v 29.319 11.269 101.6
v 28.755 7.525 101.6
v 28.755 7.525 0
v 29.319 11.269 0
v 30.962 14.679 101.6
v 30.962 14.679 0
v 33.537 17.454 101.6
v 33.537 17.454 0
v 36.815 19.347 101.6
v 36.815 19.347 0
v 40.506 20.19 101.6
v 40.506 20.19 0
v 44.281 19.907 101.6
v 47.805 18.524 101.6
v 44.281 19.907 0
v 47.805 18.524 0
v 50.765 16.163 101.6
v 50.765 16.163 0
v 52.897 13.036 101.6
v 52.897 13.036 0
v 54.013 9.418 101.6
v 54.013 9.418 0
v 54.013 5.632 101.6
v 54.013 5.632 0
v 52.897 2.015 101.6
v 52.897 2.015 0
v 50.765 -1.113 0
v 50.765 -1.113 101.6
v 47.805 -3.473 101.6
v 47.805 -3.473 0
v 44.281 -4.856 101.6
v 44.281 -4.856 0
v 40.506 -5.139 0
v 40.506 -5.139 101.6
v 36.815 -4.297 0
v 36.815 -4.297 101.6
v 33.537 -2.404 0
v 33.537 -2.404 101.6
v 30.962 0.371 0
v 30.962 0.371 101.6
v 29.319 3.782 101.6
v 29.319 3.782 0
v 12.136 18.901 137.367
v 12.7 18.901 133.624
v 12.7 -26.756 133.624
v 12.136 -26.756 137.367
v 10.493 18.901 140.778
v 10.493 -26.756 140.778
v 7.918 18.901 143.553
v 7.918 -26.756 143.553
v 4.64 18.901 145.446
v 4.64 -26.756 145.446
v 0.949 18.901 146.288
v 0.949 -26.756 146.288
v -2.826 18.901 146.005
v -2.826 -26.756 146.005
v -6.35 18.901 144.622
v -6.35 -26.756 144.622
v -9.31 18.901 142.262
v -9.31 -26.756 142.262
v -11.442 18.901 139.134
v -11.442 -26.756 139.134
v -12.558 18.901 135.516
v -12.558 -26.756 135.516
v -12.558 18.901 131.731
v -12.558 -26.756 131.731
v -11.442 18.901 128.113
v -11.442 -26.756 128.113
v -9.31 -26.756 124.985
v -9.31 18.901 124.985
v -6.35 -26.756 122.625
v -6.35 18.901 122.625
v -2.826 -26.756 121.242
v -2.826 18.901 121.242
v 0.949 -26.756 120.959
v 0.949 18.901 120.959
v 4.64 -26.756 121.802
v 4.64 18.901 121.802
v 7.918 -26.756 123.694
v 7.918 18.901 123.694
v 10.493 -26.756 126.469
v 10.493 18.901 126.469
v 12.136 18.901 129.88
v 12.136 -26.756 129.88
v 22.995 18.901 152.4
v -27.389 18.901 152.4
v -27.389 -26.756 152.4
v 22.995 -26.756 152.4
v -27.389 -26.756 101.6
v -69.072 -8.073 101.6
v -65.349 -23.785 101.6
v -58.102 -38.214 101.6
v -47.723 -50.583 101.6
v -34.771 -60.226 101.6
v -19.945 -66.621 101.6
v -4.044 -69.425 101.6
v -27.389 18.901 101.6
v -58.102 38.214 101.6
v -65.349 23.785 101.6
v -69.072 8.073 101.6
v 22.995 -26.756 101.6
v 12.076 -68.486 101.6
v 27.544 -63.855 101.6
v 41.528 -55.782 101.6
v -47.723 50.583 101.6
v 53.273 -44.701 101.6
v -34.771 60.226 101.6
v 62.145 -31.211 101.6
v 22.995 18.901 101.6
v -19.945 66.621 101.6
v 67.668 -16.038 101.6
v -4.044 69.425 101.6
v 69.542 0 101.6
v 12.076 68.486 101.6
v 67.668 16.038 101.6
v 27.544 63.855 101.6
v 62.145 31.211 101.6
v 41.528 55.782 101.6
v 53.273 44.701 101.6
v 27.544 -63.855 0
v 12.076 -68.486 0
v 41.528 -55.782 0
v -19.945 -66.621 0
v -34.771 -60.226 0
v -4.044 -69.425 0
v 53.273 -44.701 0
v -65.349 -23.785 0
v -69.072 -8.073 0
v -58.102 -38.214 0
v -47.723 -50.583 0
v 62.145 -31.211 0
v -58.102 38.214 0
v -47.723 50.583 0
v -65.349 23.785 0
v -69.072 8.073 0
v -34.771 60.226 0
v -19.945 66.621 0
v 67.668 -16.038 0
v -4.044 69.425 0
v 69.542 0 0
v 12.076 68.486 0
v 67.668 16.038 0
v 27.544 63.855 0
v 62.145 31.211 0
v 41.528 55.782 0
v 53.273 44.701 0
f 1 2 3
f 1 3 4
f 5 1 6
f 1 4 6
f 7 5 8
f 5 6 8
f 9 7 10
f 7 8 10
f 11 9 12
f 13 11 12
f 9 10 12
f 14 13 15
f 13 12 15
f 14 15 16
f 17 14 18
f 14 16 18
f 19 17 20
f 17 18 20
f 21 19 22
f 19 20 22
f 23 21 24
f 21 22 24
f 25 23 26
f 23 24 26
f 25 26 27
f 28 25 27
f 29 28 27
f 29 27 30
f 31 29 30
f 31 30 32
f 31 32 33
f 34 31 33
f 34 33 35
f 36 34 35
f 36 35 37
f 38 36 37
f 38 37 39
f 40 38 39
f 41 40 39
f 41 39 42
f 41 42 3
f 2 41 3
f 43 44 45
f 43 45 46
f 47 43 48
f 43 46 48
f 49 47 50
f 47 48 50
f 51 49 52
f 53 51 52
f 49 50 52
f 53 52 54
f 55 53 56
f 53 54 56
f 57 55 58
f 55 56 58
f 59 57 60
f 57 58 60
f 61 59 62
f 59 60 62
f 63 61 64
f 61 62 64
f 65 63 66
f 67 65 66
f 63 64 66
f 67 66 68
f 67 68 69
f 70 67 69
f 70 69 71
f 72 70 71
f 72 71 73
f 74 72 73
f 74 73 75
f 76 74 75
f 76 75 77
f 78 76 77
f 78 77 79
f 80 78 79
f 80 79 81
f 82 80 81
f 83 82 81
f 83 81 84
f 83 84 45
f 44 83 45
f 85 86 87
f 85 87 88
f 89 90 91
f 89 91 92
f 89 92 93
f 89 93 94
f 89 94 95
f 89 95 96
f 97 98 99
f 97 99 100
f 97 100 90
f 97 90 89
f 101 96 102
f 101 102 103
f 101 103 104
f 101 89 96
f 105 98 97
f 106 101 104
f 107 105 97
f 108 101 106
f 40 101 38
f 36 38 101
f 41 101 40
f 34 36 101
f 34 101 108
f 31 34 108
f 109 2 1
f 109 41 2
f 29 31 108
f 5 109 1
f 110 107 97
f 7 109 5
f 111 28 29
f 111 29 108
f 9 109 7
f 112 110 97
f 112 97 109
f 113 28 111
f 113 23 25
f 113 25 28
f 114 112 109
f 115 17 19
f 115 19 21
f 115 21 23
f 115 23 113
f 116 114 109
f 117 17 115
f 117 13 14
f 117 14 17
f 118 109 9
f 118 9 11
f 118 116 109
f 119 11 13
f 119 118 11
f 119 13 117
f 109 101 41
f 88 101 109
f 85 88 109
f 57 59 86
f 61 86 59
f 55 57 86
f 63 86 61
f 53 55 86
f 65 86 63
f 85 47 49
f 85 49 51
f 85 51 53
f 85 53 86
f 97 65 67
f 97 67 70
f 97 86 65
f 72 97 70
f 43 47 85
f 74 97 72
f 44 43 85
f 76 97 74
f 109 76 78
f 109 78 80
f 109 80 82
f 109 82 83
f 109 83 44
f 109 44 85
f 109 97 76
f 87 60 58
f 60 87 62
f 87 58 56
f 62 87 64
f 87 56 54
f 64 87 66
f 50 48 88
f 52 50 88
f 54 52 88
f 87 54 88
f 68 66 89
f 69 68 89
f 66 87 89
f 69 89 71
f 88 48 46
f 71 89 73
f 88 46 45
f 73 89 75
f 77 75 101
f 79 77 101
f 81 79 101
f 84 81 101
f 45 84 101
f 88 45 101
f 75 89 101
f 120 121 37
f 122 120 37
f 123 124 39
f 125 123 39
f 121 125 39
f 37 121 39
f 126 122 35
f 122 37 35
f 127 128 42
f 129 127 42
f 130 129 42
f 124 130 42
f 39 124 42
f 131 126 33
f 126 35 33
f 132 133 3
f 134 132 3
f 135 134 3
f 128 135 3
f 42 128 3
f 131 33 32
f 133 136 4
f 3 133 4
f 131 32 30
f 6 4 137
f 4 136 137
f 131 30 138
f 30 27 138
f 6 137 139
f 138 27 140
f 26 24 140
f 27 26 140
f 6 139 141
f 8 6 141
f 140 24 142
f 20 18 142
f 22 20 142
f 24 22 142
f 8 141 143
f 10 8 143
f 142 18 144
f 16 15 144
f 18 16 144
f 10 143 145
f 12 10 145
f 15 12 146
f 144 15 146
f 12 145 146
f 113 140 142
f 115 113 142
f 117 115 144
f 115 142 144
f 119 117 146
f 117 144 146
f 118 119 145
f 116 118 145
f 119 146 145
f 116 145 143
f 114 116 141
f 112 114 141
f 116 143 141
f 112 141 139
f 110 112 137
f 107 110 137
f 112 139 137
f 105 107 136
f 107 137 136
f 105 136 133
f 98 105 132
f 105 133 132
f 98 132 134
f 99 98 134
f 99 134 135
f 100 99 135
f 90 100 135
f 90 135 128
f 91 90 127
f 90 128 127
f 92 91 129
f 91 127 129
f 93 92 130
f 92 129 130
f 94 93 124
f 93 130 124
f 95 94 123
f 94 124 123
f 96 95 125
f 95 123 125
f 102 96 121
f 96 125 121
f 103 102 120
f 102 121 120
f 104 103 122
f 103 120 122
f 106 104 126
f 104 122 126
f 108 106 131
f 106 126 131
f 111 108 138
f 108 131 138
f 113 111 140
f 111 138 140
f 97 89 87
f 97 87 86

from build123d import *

# Parameters (mm, degrees)
F0_R     = 69.542462
F1_DEPTH = 101.6
F2_W     = 50.384016
F2_H     = 45.657624
F3_DEPTH = 50.8
F5_D     = 25.4
F7_D     = 25.4


with BuildPart() as f1:
    # F0 (on Top) → F1 (new body)
    with BuildSketch(Plane.XY):
        Circle(F0_R)
    extrude(amount=F1_DEPTH)

    # F2 (on face) → F3 (join)
    with BuildSketch(Plane.XY.offset(101.6)):
        with Locations((-2.197395, -3.927665)):
            Rectangle(F2_W, F2_H)
    extrude(amount=F3_DEPTH)

    # F5 (through all)
    with Locations(Plane(origin=(0, 18.901147, 0), x_dir=(-1, 0, 0), z_dir=(0, 1, 0))):
        with Locations((0, 133.62363)):
            Hole(F5_D / 2)

    # F7 (through all)
    with Locations(Plane.XY.offset(101.6)):
        with Locations((41.455068, 7.525192)):
            Hole(F7_D / 2)


solid = f1.part
